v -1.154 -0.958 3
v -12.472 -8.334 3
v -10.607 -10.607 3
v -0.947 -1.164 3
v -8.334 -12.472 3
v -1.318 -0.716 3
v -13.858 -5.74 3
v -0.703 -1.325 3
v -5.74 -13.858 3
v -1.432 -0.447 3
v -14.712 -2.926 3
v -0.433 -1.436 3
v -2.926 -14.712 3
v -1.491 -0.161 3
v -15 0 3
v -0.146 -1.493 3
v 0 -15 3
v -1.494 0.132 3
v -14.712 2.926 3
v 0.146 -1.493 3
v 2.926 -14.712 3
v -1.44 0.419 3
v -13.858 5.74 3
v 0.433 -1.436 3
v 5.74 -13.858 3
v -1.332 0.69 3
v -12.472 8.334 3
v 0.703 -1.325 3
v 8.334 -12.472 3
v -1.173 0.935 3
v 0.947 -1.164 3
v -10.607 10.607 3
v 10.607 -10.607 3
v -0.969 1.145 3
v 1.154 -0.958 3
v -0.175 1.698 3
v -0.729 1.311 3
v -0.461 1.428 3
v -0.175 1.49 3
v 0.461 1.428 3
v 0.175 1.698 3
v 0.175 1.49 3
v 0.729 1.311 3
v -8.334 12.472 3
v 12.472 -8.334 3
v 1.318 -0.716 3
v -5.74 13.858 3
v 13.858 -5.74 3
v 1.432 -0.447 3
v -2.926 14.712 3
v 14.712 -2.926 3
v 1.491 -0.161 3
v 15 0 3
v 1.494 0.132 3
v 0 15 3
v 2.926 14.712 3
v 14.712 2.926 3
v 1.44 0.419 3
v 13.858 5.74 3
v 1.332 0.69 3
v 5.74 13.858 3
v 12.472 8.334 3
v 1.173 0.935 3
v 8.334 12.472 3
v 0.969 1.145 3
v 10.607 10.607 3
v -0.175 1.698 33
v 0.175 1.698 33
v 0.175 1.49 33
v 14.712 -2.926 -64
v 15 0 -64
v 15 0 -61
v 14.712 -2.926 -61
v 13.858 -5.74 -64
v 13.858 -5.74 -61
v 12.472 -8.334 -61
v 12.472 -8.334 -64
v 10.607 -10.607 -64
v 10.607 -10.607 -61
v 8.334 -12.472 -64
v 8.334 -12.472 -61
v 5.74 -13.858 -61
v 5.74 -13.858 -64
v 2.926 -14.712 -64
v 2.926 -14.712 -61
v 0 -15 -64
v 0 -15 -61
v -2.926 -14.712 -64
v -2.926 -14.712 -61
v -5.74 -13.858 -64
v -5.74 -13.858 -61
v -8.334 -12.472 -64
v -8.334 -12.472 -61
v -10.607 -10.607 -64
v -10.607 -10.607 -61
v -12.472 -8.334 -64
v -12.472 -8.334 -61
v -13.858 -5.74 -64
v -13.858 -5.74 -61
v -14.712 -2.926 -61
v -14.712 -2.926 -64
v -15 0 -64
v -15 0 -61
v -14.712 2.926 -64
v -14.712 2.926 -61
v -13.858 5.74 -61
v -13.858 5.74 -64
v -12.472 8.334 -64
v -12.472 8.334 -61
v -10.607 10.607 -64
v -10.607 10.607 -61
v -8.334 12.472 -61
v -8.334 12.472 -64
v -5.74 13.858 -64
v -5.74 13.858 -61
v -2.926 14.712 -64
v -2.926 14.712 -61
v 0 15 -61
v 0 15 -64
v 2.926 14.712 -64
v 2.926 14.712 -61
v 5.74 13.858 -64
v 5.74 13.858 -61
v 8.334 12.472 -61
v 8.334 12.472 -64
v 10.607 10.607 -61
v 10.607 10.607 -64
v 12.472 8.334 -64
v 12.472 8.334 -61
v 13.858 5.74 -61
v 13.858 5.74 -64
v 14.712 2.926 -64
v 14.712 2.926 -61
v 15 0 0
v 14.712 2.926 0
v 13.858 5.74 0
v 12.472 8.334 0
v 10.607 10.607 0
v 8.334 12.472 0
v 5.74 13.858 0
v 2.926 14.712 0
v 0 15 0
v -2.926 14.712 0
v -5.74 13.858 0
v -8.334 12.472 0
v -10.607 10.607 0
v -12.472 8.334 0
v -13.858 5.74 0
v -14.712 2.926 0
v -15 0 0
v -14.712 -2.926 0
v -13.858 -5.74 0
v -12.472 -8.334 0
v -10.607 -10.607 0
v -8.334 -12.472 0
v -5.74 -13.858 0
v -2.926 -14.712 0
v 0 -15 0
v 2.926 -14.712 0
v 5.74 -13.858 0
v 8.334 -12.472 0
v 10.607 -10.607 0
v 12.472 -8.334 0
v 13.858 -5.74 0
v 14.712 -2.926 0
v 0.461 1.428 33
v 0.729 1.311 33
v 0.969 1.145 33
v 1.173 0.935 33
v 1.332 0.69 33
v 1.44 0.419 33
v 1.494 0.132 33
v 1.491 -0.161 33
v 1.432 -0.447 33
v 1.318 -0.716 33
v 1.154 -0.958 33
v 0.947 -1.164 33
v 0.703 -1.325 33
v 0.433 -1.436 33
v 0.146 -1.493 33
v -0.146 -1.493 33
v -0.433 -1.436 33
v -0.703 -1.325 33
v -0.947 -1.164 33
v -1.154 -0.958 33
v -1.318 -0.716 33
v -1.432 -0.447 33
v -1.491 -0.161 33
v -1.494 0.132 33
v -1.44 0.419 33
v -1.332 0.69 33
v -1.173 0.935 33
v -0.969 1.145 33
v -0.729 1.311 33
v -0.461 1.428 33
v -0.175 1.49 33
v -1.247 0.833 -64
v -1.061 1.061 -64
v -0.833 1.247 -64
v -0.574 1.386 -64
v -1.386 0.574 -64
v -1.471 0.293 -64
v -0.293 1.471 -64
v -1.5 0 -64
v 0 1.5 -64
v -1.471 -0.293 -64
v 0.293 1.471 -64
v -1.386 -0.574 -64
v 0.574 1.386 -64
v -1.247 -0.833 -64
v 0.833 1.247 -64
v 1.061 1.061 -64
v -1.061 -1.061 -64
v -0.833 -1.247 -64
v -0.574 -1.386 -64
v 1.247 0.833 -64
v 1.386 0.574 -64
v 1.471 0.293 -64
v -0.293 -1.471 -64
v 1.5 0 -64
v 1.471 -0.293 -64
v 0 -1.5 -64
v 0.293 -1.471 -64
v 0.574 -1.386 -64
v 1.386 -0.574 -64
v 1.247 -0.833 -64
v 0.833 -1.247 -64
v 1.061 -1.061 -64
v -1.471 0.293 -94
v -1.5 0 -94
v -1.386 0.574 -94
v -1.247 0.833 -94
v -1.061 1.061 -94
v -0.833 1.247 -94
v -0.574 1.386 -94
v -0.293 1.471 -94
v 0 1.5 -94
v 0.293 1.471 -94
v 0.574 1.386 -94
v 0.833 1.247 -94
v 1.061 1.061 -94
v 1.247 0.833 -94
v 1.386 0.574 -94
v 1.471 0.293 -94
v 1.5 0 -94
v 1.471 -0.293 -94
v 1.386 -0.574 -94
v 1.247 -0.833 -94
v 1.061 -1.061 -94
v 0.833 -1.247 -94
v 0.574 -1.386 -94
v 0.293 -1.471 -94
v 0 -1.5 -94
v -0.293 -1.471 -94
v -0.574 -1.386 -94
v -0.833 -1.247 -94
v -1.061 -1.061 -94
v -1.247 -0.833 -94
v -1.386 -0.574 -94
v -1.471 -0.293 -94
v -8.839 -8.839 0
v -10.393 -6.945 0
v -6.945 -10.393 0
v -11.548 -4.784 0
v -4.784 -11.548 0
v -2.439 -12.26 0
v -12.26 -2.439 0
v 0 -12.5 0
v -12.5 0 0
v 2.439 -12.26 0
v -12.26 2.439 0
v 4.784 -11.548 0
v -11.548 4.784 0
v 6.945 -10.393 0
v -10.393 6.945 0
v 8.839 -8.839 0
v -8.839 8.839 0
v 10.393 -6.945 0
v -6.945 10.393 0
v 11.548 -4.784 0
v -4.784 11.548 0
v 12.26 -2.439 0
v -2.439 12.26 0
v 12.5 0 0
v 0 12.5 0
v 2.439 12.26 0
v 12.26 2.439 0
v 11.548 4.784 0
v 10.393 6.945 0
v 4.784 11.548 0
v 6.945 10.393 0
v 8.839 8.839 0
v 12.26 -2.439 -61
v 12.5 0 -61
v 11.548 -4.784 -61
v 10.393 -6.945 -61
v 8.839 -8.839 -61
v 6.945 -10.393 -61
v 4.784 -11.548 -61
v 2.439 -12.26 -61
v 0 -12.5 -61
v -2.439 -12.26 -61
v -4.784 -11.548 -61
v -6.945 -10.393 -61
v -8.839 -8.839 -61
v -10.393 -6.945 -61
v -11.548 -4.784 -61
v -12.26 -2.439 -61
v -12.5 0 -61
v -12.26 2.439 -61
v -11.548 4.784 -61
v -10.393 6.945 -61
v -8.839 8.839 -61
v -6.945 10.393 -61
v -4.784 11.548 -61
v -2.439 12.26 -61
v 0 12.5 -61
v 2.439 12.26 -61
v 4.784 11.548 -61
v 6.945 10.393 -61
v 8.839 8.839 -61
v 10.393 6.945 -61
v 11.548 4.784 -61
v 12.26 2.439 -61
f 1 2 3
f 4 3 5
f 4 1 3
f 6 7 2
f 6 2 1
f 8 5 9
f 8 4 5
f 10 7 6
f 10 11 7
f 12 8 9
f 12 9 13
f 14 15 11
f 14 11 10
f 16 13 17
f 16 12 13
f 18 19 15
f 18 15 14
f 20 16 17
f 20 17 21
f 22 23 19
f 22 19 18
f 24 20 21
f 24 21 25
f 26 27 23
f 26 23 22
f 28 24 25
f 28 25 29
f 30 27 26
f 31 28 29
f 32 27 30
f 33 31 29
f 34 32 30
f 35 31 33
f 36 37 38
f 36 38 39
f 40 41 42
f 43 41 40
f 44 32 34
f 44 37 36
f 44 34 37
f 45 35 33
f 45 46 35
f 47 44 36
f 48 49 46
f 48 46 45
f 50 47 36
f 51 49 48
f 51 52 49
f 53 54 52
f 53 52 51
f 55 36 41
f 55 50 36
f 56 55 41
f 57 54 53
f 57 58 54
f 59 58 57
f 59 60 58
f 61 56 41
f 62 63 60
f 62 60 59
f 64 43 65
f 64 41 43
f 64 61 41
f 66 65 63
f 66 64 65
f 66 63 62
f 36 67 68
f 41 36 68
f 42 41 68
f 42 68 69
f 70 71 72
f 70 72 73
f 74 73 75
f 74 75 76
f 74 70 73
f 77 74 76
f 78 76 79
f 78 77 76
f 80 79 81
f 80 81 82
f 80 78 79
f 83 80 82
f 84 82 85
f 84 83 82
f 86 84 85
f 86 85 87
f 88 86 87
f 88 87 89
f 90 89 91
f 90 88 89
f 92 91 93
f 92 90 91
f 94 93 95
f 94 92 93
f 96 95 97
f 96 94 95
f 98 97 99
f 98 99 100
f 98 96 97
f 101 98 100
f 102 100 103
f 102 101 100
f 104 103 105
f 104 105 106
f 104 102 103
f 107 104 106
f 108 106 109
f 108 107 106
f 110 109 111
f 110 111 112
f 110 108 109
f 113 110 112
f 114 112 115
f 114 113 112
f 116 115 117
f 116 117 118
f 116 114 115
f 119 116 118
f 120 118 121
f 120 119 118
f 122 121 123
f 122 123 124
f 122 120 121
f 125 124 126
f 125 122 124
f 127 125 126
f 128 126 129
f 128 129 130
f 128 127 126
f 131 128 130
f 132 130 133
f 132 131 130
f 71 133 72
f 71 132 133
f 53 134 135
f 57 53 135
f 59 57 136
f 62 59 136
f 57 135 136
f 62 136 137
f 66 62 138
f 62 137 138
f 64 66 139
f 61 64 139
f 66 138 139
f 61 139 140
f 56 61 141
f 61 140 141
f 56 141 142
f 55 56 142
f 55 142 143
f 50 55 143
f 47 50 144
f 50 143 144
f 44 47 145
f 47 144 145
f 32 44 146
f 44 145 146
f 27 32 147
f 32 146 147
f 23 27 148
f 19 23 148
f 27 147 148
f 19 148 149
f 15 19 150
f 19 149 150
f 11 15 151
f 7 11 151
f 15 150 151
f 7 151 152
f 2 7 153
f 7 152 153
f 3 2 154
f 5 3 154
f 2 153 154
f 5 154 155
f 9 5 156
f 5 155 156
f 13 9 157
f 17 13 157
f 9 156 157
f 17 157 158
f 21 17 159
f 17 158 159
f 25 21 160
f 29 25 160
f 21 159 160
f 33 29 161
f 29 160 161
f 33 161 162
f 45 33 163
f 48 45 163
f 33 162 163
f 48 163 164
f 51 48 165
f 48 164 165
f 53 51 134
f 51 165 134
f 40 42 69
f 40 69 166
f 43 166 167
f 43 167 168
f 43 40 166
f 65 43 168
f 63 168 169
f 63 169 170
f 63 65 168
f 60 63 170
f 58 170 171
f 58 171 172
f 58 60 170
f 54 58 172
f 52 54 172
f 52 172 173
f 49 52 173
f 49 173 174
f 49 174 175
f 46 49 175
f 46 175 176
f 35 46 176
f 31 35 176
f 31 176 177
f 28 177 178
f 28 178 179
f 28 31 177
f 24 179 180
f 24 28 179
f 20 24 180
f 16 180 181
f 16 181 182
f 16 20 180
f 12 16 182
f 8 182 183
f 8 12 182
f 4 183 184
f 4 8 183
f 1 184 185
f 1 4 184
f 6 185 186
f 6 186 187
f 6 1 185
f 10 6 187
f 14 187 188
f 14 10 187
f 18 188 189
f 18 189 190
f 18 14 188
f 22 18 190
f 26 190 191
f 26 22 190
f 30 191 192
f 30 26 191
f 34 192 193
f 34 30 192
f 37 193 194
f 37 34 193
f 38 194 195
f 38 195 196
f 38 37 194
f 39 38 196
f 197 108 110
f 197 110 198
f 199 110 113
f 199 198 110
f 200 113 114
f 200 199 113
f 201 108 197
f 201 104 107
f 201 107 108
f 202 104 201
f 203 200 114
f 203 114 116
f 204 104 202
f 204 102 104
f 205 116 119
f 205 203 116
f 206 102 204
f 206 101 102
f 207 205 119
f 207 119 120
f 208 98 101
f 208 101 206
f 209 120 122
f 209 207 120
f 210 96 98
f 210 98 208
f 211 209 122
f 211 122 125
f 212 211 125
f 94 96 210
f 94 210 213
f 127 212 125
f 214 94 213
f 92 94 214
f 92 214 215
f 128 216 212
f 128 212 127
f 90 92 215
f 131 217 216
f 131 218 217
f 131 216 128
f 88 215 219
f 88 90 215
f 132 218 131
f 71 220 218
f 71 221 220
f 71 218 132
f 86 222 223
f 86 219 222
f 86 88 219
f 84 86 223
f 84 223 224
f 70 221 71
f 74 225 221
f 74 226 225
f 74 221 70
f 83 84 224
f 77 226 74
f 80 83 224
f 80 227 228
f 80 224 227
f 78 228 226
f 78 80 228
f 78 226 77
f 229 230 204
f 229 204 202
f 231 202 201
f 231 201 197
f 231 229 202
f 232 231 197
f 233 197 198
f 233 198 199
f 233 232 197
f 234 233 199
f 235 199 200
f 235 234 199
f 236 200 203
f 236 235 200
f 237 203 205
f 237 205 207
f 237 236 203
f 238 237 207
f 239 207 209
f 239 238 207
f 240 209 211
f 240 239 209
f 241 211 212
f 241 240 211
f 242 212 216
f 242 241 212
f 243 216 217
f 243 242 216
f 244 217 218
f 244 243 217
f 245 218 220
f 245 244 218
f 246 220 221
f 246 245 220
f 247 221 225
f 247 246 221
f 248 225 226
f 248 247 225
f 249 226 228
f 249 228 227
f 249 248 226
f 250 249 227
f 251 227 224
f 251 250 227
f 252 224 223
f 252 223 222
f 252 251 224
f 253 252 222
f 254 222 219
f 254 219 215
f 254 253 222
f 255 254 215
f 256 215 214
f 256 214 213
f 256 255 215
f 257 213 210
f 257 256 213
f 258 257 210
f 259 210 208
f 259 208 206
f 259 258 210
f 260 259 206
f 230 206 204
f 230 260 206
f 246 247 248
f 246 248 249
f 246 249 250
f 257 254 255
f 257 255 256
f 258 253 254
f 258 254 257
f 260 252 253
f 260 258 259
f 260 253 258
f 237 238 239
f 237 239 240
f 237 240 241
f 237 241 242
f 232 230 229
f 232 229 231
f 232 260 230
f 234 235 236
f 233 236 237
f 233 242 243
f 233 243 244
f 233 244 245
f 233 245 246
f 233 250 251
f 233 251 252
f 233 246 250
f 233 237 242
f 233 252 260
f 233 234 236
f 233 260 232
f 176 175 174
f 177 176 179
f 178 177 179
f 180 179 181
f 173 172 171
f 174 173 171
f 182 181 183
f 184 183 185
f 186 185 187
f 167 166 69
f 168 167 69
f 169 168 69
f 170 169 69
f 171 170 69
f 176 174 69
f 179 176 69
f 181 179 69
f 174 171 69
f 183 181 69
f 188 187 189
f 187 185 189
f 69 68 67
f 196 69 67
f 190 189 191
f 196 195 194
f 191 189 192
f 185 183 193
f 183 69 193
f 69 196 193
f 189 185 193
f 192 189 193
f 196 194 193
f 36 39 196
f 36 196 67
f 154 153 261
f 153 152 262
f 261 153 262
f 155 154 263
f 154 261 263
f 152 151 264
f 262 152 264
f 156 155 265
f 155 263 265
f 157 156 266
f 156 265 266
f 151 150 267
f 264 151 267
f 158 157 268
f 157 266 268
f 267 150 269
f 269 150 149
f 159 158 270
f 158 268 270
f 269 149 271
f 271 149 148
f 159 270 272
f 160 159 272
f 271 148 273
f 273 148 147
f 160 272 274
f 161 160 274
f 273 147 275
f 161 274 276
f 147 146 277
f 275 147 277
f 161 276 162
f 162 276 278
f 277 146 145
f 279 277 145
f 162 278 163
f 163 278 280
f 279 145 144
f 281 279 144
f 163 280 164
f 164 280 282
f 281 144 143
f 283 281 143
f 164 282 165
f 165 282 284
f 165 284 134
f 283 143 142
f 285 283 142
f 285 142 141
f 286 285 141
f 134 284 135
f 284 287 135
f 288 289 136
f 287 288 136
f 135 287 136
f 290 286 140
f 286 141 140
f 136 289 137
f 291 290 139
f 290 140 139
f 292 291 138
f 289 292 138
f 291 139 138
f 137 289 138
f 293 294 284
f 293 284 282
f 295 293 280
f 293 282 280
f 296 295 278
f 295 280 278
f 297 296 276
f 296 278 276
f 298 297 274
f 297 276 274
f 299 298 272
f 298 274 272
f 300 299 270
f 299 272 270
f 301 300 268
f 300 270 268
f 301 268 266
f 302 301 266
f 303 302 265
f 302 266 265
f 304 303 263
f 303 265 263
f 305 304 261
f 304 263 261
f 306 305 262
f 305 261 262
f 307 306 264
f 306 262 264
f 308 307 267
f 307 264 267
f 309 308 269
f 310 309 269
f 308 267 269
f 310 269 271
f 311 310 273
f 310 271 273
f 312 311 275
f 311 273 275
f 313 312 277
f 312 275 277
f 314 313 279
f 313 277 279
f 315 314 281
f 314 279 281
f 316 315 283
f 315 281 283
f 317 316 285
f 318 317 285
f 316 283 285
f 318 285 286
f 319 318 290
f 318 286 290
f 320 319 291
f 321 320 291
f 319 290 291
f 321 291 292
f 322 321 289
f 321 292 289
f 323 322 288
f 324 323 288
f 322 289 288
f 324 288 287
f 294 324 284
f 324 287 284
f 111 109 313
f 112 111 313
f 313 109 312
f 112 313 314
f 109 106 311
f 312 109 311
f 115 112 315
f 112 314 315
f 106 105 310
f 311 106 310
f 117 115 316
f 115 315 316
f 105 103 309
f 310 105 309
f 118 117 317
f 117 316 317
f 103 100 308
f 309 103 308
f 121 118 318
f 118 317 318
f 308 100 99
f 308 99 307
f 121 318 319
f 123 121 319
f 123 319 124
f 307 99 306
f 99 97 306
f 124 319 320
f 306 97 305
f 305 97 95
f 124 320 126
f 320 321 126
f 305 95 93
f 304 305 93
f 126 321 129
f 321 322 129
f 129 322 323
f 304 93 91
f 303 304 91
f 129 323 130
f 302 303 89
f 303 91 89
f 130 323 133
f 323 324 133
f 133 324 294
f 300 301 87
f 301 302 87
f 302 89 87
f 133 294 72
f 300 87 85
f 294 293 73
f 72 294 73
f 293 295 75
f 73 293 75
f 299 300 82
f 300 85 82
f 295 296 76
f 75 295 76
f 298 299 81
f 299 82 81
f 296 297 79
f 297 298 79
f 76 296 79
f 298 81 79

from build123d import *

# Parameters (mm, degrees)
CROQUIS1_R              = 15
SALIENTE_EXTRUIR1_DEPTH = 3
SALIENTE_EXTRUIR2_DEPTH = 30
CROQUIS3_R              = 12.5
SALIENTE_EXTRUIR3_DEPTH = 61
SALIENTE_EXTRUIR4_START = 3
CROQUIS4_R              = 15
SALIENTE_EXTRUIR4_DEPTH = 3
SALIENTE_EXTRUIR5_START = 30
CROQUIS5_R              = 1.5
SALIENTE_EXTRUIR5_DEPTH = 30


with BuildPart() as part:
    # Croquis1 → Saliente-Extruir1 (new body)
    with BuildSketch(Plane.XY):
        Circle(CROQUIS1_R)
    extrude(amount=SALIENTE_EXTRUIR1_DEPTH)

    # Croquis2 → Saliente-Extruir2 (add)
    with BuildSketch(Plane.XY.offset(3)):
        with BuildLine():
            Line((-0.175, 1.489756692), (-0.175, 1.697953704))
            Line((-0.175, 1.697953704), (0.175, 1.697953704))
            Line((0.175, 1.697953704), (0.175, 1.489756692))
            ThreePointArc((0.175, 1.489756692), (0, -1.5), (-0.175, 1.489756692))
        make_face()
    extrude(amount=SALIENTE_EXTRUIR2_DEPTH)

    # Croquis3 → Saliente-Extruir3 (add)
    with BuildSketch(Plane(origin=(0, 0, 0), x_dir=(-1, 0, 0), z_dir=(0, 0, -1))):
        with Locations(Location((0, 0, 0), (0, 0, 180))):
            Circle(CROQUIS3_R)
    extrude(amount=SALIENTE_EXTRUIR3_DEPTH)

    # Croquis4 → Saliente-Extruir4 (add)
    with BuildSketch(Plane(origin=(0, 0, -61), x_dir=(-1, 0, 0), z_dir=(0, 0, -1)).offset(SALIENTE_EXTRUIR4_START)):
        with Locations(Location((0, 0, 0), (0, 0, 180))):
            Circle(CROQUIS4_R)
    extrude(amount=-SALIENTE_EXTRUIR4_DEPTH)

    # Croquis5 → Saliente-Extruir5 (add)
    with BuildSketch(Plane(origin=(0, 0, -64), x_dir=(-1, 0, 0), z_dir=(0, 0, -1)).offset(SALIENTE_EXTRUIR5_START)):
        Circle(CROQUIS5_R)
    extrude(amount=-SALIENTE_EXTRUIR5_DEPTH)


solid = part.part
